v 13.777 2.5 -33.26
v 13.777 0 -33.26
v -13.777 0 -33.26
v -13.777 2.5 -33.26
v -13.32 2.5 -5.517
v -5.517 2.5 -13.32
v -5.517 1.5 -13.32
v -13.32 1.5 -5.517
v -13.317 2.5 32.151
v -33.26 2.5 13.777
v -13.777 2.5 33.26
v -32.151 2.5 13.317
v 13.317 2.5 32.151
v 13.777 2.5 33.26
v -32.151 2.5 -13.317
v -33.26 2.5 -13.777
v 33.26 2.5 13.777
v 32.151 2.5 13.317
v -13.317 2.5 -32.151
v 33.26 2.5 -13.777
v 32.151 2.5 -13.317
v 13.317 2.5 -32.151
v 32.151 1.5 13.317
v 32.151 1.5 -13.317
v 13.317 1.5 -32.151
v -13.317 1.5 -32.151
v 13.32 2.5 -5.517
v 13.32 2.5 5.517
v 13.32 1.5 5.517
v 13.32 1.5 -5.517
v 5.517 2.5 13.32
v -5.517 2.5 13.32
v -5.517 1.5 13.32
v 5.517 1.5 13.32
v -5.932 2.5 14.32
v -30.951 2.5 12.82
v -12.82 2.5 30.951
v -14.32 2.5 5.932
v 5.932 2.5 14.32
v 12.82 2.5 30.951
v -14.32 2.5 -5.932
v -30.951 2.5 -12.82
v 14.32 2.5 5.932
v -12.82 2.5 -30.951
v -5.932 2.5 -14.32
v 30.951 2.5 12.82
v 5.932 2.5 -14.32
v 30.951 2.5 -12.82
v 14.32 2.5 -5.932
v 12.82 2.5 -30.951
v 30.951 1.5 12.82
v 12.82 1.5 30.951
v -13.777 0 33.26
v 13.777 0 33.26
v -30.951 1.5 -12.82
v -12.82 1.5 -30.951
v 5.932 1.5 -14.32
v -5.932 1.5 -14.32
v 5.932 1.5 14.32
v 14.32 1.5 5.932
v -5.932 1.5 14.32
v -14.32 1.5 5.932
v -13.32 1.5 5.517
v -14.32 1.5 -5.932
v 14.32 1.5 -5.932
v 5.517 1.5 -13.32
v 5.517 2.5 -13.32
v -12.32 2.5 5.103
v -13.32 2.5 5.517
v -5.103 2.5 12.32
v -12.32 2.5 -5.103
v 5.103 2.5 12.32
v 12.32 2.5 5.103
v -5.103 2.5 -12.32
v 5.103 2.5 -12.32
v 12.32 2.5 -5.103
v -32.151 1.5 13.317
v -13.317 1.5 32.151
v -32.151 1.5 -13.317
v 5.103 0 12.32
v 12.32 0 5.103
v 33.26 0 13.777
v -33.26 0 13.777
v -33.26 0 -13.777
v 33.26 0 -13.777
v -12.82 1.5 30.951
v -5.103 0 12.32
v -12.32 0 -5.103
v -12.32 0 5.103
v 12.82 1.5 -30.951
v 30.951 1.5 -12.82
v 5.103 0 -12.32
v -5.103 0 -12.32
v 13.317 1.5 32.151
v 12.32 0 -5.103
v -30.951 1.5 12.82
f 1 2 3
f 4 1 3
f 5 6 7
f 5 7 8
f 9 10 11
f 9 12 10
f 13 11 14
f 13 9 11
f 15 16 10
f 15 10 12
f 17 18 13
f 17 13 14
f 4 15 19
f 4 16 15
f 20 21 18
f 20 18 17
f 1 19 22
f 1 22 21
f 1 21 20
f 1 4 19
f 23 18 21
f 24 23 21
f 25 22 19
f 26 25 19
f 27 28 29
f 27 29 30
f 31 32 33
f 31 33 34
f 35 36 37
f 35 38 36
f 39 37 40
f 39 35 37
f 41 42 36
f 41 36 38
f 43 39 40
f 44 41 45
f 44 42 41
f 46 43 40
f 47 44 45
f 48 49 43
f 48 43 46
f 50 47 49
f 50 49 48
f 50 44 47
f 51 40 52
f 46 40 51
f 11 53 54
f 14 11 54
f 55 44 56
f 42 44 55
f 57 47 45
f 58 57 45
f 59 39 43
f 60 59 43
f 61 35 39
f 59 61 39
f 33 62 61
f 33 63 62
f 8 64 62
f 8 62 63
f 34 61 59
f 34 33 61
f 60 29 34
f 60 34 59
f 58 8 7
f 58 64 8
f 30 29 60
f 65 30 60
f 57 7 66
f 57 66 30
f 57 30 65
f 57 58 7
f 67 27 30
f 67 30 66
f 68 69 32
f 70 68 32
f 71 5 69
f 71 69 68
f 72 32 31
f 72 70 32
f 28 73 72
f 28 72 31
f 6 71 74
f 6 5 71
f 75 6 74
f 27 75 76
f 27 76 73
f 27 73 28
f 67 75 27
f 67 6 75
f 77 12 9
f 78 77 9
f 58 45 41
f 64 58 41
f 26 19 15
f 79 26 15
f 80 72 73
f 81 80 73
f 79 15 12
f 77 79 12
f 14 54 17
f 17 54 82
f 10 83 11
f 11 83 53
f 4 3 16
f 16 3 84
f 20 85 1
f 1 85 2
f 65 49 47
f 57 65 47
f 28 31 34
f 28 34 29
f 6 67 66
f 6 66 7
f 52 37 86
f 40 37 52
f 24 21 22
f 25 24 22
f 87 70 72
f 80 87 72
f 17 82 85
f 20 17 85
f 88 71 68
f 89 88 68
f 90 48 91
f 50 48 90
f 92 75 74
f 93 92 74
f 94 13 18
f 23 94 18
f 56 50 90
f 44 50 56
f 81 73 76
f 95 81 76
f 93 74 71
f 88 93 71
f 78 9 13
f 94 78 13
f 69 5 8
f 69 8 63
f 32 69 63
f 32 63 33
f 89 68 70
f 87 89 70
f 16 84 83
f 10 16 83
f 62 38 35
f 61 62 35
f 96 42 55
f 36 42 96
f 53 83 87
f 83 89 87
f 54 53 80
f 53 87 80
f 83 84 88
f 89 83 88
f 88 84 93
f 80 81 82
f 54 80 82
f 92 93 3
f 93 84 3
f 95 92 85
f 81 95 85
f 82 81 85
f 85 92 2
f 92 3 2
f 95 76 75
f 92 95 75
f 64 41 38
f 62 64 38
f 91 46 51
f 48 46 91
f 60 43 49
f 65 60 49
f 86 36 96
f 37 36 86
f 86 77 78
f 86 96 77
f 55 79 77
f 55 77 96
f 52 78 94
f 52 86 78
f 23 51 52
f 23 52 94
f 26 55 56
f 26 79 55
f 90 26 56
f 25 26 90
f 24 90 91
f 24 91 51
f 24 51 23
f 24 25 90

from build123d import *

# Parameters (mm, degrees)
EXTRUDE_1_DEPTH     = 2.5
CUT_EXTRUDE_1_DEPTH = 1
CUT_EXTRUDE_2_DEPTH = 3.8
CUT_EXTRUDE_3_DEPTH = 1


with BuildPart() as part:
    # 스케치1 → 보스-돌출1 (new body)
    with BuildSketch(Plane(origin=(0, 0, 0), x_dir=(1, 0, 0), z_dir=(0, 1, 0))):
        Polygon((-13.776603565, -33.25966317), (13.776603565, -33.25966317), (33.25966317, -13.776603565), (33.25966317, 13.776603565), (13.776603565, 33.25966317), (-13.776603565, 33.25966317), (-33.25966317, 13.776603565), (-33.25966317, -13.776603565), align=None)
    extrude(amount=EXTRUDE_1_DEPTH)

    # 스케치2 → 컷-돌출1 (cut)
    with BuildSketch(Plane(origin=(0, 2.5, 0), x_dir=(1, 0, 0), z_dir=(0, 1, 0))):
        Polygon((13.317383446, -32.151007731), (32.151007731, -13.317383446), (32.151007731, 13.317383446), (13.317383446, 32.151007731), (-13.317383446, 32.151007731), (-32.151007731, 13.317383446), (-32.151007731, -13.317383446), (-13.317383446, -32.151007731), align=None)
        Polygon((12.820327171, -30.951007731), (30.951007731, -12.820327171), (30.951007731, 12.820327171), (12.820327171, 30.951007731), (-12.820327171, 30.951007731), (-30.951007731, 12.820327171), (-30.951007731, -12.820327171), (-12.820327171, -30.951007731), align=None, mode=Mode.SUBTRACT)
    extrude(amount=-CUT_EXTRUDE_1_DEPTH, mode=Mode.SUBTRACT)

    # 스케치4 → 컷-돌출2 (cut)
    with BuildSketch(Plane(origin=(0, 2.5, 0), x_dir=(1, 0, 0), z_dir=(0, 1, 0))):
        Polygon((-5.103166077, -12.320132754), (5.103166077, -12.320132754), (12.320132754, -5.103166077), (12.320132754, 5.103166077), (5.103166077, 12.320132754), (-5.103166077, 12.320132754), (-12.320132754, 5.103166077), (-12.320132754, -5.103166077), align=None)
    extrude(amount=-CUT_EXTRUDE_2_DEPTH, mode=Mode.SUBTRACT)

    # 스케치4<3> → 컷-돌출3 (cut)
    with BuildSketch(Plane(origin=(0, 2.5, 0), x_dir=(1, 0, 0), z_dir=(0, 1, 0))):
        Polygon((-5.931593202, -14.320132754), (5.931593202, -14.320132754), (14.320132754, -5.931593202), (14.320132754, 5.931593202), (5.931593202, 14.320132754), (-5.931593202, 14.320132754), (-14.320132754, 5.931593202), (-14.320132754, -5.931593202), align=None)
        Polygon((13.320132754, -5.517379639), (5.517379639, -13.320132754), (-5.517379639, -13.320132754), (-13.320132754, -5.517379639), (-13.320132754, 5.517379639), (-5.517379639, 13.320132754), (5.517379639, 13.320132754), (13.320132754, 5.517379639), align=None, mode=Mode.SUBTRACT)
    extrude(amount=-CUT_EXTRUDE_3_DEPTH, mode=Mode.SUBTRACT)


solid = part.part
